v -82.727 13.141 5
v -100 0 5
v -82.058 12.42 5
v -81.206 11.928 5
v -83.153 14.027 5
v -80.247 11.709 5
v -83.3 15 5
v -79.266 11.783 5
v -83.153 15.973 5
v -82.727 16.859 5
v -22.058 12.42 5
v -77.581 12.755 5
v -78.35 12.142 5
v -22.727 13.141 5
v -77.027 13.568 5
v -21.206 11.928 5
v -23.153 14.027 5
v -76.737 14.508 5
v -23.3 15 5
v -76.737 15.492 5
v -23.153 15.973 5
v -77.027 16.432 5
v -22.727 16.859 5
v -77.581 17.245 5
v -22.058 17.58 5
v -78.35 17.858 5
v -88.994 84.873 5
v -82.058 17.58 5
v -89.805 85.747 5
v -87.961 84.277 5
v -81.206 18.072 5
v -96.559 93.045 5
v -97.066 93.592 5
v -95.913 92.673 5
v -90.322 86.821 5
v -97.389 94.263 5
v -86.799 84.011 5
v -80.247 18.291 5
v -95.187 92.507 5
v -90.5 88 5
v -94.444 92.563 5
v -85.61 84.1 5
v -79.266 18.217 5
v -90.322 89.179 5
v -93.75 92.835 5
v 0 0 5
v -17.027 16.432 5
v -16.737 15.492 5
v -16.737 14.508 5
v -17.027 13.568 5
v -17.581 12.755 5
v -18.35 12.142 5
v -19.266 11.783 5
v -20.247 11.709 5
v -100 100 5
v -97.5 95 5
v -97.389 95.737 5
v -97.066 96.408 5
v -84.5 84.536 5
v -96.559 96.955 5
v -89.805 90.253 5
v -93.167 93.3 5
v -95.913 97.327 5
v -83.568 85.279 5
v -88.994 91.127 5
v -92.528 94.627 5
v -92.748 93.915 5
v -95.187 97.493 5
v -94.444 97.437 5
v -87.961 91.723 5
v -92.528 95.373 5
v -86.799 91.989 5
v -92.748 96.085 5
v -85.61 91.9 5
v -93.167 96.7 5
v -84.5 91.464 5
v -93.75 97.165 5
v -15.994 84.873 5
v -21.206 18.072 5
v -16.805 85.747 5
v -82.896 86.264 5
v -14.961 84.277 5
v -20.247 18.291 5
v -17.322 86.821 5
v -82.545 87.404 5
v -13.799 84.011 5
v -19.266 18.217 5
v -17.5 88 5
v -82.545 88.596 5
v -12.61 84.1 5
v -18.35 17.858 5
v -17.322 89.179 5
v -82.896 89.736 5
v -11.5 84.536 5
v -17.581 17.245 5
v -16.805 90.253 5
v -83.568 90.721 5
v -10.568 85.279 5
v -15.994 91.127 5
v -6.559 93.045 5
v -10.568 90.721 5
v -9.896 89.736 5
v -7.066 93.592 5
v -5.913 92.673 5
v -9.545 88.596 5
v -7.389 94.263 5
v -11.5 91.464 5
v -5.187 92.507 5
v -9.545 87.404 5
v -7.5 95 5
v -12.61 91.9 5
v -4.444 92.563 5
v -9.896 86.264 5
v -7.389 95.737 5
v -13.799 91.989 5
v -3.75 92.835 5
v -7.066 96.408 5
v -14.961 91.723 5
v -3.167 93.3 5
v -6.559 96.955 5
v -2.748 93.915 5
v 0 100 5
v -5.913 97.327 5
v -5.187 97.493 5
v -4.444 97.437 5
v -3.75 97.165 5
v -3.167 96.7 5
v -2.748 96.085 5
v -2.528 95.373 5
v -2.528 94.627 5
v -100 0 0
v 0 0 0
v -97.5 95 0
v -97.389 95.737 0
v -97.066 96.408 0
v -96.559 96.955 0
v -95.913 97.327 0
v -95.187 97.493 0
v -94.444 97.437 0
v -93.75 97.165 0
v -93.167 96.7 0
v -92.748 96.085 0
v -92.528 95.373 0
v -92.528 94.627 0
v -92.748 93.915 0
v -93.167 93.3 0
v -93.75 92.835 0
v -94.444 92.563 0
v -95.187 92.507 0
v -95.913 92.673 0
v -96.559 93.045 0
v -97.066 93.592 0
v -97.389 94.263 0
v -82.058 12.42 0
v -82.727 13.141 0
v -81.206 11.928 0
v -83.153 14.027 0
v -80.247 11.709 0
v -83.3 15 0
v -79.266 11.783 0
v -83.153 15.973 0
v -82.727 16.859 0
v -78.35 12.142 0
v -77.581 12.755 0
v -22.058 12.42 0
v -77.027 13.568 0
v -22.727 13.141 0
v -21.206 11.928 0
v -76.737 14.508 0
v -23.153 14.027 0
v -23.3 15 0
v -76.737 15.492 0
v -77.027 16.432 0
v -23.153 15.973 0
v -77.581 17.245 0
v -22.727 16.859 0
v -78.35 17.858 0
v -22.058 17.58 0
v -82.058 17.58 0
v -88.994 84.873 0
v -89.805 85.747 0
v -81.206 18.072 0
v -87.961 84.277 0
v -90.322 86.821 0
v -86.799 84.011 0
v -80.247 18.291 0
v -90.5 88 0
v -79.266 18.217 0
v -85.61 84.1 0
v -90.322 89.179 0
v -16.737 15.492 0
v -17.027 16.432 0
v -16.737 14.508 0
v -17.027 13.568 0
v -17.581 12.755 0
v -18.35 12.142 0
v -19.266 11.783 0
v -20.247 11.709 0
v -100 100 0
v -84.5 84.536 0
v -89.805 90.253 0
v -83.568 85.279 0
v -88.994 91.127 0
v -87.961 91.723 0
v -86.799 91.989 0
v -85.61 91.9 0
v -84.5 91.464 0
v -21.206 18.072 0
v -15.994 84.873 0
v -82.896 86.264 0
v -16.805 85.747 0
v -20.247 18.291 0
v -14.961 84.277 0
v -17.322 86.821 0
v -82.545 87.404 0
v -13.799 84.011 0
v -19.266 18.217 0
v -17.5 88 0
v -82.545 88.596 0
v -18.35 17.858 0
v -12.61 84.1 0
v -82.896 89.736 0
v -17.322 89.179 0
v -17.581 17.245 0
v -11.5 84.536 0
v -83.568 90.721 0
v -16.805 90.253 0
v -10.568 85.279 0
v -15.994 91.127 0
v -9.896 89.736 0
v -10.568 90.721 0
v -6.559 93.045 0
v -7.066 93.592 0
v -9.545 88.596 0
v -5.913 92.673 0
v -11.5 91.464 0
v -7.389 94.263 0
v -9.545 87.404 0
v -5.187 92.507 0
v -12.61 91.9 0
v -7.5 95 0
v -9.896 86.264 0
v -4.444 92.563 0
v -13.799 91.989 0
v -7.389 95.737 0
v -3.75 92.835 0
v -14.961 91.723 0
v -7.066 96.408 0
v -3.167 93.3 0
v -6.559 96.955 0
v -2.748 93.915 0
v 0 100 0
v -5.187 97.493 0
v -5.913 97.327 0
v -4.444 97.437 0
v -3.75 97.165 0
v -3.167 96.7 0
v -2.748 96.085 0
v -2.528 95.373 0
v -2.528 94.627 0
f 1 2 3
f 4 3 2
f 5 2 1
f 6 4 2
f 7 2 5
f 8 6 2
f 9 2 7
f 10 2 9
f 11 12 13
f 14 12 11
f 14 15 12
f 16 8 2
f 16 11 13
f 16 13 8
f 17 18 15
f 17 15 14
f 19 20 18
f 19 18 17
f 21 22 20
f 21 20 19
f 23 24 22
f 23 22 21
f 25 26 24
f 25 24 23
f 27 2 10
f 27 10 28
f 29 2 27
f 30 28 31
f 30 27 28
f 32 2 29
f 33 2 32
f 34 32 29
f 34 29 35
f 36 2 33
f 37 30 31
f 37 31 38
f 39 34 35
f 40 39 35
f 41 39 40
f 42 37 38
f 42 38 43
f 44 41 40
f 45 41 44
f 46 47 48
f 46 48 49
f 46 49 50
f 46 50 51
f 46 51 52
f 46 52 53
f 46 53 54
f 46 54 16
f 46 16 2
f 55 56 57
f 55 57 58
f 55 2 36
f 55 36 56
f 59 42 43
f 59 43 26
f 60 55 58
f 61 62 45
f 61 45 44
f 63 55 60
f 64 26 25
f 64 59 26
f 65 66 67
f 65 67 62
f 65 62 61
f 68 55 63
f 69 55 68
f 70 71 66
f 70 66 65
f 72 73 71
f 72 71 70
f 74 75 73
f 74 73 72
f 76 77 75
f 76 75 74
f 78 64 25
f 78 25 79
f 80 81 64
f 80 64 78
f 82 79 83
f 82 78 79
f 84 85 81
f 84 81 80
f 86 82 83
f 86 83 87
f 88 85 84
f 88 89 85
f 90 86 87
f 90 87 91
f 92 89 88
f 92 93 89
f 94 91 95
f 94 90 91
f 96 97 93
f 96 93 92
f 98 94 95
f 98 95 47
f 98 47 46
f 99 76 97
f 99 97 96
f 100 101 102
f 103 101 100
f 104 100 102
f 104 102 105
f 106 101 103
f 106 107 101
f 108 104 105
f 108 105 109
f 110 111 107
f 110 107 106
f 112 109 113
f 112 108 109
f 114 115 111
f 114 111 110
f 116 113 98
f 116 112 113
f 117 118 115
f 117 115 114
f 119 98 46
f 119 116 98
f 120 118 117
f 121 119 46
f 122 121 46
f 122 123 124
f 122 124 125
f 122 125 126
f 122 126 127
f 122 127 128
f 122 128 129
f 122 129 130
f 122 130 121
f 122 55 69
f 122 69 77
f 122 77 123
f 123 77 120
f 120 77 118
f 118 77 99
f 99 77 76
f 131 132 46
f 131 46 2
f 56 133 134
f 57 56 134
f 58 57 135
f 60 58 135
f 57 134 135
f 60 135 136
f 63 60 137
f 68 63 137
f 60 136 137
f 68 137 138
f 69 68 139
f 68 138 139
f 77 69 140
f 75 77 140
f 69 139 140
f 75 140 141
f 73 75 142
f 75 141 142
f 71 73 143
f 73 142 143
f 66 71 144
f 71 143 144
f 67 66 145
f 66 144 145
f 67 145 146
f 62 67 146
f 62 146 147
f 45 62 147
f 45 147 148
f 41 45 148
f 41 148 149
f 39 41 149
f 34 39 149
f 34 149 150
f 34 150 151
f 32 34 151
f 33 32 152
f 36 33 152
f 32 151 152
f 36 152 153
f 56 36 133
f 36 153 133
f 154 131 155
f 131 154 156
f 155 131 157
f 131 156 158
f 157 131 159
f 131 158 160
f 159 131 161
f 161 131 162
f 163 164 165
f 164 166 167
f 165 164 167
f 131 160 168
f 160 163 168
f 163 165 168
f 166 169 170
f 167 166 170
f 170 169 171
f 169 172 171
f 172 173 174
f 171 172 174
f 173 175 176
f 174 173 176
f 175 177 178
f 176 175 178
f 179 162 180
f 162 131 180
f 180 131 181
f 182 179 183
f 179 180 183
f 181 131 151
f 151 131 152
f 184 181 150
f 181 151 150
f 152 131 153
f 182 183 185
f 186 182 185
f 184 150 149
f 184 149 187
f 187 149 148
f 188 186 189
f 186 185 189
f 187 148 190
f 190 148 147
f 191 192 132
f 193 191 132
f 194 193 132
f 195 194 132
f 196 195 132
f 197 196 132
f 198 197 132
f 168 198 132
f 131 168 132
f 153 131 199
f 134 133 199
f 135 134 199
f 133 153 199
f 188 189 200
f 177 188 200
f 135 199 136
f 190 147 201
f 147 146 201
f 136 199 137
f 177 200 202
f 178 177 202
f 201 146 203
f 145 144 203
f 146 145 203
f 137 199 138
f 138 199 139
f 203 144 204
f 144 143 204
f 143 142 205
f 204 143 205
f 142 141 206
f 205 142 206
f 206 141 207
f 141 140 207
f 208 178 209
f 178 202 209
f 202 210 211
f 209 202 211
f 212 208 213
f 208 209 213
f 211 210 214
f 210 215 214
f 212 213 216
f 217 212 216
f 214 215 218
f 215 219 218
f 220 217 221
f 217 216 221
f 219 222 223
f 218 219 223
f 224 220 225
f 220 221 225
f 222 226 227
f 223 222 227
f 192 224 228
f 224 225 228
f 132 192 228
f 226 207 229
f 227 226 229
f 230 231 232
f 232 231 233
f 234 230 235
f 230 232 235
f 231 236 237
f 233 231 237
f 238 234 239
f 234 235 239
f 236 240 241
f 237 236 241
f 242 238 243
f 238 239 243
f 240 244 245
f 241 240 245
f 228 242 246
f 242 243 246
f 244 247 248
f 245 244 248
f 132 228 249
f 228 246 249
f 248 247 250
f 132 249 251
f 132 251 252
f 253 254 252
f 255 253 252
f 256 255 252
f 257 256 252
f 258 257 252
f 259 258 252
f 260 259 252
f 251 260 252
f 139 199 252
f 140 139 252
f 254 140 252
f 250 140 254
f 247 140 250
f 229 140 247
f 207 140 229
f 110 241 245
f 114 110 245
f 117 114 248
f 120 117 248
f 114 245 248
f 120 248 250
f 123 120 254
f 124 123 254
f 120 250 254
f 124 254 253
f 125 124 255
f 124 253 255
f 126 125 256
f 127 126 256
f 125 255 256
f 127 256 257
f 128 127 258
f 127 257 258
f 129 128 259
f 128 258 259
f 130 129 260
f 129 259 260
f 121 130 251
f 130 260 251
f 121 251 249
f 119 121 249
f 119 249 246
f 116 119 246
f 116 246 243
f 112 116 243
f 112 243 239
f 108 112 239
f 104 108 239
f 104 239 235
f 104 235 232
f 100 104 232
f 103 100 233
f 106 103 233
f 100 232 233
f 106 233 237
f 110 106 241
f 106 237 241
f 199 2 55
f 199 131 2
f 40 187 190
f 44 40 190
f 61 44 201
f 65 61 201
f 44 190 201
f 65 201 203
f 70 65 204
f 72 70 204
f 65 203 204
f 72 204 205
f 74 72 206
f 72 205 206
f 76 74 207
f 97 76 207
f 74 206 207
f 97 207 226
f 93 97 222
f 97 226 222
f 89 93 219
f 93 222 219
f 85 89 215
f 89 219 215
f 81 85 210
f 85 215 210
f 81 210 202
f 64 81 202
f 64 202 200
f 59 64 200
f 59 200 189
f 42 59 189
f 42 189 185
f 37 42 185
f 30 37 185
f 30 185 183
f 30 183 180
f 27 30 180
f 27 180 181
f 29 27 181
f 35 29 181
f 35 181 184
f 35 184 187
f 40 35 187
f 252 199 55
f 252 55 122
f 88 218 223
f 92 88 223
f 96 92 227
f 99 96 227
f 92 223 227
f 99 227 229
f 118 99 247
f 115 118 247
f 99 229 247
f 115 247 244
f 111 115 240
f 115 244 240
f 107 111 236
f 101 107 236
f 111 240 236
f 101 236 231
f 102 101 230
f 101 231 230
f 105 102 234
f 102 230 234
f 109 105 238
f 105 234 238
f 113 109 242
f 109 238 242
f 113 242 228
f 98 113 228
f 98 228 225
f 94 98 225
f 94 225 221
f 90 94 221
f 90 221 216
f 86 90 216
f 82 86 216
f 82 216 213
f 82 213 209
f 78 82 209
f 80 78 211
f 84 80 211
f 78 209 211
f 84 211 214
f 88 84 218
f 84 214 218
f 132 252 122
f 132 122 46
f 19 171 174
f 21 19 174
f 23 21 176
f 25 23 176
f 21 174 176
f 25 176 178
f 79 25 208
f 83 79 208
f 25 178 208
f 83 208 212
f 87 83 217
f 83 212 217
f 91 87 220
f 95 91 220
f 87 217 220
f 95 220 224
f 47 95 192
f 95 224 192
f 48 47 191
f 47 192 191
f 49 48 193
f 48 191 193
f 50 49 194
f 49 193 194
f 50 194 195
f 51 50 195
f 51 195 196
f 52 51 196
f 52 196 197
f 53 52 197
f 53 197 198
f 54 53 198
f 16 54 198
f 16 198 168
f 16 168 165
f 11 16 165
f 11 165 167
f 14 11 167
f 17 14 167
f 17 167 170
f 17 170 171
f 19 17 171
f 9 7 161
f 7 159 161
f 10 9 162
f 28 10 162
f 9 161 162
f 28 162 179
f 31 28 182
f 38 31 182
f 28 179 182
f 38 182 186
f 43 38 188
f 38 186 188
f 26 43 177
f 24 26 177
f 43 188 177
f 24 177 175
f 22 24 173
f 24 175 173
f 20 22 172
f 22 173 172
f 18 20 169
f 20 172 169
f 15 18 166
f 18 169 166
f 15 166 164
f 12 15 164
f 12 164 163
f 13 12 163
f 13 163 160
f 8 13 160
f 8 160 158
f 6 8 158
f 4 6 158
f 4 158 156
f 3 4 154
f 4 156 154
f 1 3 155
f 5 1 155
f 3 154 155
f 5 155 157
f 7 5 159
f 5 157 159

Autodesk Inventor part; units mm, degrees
ref_plane "YZ Plane" through (0, 0, 0) normal (1, 0, 0) x (0, 1, 0)
ref_plane "XZ Plane" through (0, 0, 0) normal (0, 1, 0) x (-1, 0, 0)
ref_plane "XY Plane" through (0, 0, 0) normal (0, 0, 1) x (1, 0, 0)
sketch "Sketch1" plane through (0, 0, 0) normal (0, 0, 1) x (1, 0, 0)
  line L0 (0, 0) -> (-100, 0)
  line L1 (-100, 0) -> (-100, 100)
  line L2 (-100, 100) -> (0, 100)
  line L3 (0, 100) -> (0, 0)
  dimension "d0" = 100
  dimension "d1" = 100
extrude "Extrusion1" add sketch "Sketch1" along normal blind 5
sketch "Sketch11" plane through (-80, 15, 0) normal (0, 0, -1) x (-1, 0, 0)
  circle A0 centre (0, 0) radius 3.3
  circle A1 centre (-30, 0) radius 5 projected
  circle A2 centre (-30, 0) radius 3
  circle A3 centre (-60, 0) radius 5 projected
  circle A4 centre (-60, 0) radius 3.3
  point P0 (-80, -15)
  dimension "d101" = 6.6
  dimension "d102" = 6
  dimension "d103" = 6.6
extrude "Extrusion11" cut sketch "Sketch11" along normal through all both and the other way through all contours A0 | A4
sketch "Sketch7" plane through (0, 0, 0) normal (0, 0, -1) x (-1, 0, 0)
  line L0 (100, 25) -> (0, 25)
  line L1 (100, 56.2495) -> (100, 25)
  line L2 (100, 100) -> (0, 100)
  line L3 (0, 0) -> (100, 0) projected
  circle A0 centre (86.5, 88) radius 4
  circle A1 centre (86.5, 88) radius 1.65
  line L4 (50, 100) -> (50, 0)
  line L5 (100, 0) -> (0, 0) projected
  line L6 (0, 100) -> (0, 100)
  line L7 (0, 100) -> (0, 98.5)
  circle A2 centre (95, 95) radius 2.5
  line L8 (100, 0) -> (100, 100) projected
  line L9 (0, 0) -> (100, 0) projected
  line L10 (100, 0) -> (100, 100) projected
  line L11 (100, 100) -> (0, 100) projected
  line L12 (0, 100) -> (0, 0) projected
  circle A3 centre (13.5, 88) radius 4
  circle A4 centre (13.5, 88) radius 1.65
  circle A5 centre (5, 95) radius 2.5
  point P0 (95.4835, 97.4528)
  point P1 (95.4244, 97.4637)
  point P2 (0, 100)
  point P3 (0, 100)
  point P4 (4.5165, 97.4528)
  point P5 (4.5756, 97.4637)
  point P6 (0, 100)
  dimension "d72" = 25
  dimension "d77" = 8
  dimension "d78" = 3.3
  dimension "d88" = 5
  dimension "d111" = 5
  dimension "d112" = 8.5
  dimension "d121" = 7
  dimension "d122" = 5
extrude "Extrusion13" cut sketch "Sketch7" against normal blind 10 contours A0 | A1 | A2 | A3 | A4 | A5
sketch "Sketch13" plane through (0, 0, 5) normal (0, 0, 1) x (1, 0, 0)
  line L0 (-10, 25) -> (-90, 25) construction
  line L1 (-90, 25) -> (-90, 85) construction
  line L2 (-90, 85) -> (-10, 85) construction
  line L3 (-10, 85) -> (-10, 25) construction
  line L4 (0, 0) -> (0, 100) projected
  line L5 (-100, 100) -> (-100, 0) projected
  line L6 (-100, 0) -> (0, 0) projected
  dimension "d123" = 10
  dimension "d124" = 80
  dimension "d125" = 60
  dimension "d126" = 100
  dimension "d127" = 25
equation "\"d103\" = d101"
equation "\"d88\" = d86"
equation "\"d123\" = -0.5 * d124 + 0.5 * d126"
equation "\"d86\" = 5"
properties part number "PlaqueGuideBlocLame" material "Aluminum 6061"
